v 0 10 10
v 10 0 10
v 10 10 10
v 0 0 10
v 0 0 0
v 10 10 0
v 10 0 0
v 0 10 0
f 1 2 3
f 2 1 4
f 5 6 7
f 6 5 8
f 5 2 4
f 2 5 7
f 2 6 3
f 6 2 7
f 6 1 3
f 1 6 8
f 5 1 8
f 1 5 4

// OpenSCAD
/* fc-meta
title: e2e fixture cube
created: 2026-05-12
tool: fastcad-tests
*/

module cube_1() {
  cube([10, 10, 10]);
}
cube_1();
